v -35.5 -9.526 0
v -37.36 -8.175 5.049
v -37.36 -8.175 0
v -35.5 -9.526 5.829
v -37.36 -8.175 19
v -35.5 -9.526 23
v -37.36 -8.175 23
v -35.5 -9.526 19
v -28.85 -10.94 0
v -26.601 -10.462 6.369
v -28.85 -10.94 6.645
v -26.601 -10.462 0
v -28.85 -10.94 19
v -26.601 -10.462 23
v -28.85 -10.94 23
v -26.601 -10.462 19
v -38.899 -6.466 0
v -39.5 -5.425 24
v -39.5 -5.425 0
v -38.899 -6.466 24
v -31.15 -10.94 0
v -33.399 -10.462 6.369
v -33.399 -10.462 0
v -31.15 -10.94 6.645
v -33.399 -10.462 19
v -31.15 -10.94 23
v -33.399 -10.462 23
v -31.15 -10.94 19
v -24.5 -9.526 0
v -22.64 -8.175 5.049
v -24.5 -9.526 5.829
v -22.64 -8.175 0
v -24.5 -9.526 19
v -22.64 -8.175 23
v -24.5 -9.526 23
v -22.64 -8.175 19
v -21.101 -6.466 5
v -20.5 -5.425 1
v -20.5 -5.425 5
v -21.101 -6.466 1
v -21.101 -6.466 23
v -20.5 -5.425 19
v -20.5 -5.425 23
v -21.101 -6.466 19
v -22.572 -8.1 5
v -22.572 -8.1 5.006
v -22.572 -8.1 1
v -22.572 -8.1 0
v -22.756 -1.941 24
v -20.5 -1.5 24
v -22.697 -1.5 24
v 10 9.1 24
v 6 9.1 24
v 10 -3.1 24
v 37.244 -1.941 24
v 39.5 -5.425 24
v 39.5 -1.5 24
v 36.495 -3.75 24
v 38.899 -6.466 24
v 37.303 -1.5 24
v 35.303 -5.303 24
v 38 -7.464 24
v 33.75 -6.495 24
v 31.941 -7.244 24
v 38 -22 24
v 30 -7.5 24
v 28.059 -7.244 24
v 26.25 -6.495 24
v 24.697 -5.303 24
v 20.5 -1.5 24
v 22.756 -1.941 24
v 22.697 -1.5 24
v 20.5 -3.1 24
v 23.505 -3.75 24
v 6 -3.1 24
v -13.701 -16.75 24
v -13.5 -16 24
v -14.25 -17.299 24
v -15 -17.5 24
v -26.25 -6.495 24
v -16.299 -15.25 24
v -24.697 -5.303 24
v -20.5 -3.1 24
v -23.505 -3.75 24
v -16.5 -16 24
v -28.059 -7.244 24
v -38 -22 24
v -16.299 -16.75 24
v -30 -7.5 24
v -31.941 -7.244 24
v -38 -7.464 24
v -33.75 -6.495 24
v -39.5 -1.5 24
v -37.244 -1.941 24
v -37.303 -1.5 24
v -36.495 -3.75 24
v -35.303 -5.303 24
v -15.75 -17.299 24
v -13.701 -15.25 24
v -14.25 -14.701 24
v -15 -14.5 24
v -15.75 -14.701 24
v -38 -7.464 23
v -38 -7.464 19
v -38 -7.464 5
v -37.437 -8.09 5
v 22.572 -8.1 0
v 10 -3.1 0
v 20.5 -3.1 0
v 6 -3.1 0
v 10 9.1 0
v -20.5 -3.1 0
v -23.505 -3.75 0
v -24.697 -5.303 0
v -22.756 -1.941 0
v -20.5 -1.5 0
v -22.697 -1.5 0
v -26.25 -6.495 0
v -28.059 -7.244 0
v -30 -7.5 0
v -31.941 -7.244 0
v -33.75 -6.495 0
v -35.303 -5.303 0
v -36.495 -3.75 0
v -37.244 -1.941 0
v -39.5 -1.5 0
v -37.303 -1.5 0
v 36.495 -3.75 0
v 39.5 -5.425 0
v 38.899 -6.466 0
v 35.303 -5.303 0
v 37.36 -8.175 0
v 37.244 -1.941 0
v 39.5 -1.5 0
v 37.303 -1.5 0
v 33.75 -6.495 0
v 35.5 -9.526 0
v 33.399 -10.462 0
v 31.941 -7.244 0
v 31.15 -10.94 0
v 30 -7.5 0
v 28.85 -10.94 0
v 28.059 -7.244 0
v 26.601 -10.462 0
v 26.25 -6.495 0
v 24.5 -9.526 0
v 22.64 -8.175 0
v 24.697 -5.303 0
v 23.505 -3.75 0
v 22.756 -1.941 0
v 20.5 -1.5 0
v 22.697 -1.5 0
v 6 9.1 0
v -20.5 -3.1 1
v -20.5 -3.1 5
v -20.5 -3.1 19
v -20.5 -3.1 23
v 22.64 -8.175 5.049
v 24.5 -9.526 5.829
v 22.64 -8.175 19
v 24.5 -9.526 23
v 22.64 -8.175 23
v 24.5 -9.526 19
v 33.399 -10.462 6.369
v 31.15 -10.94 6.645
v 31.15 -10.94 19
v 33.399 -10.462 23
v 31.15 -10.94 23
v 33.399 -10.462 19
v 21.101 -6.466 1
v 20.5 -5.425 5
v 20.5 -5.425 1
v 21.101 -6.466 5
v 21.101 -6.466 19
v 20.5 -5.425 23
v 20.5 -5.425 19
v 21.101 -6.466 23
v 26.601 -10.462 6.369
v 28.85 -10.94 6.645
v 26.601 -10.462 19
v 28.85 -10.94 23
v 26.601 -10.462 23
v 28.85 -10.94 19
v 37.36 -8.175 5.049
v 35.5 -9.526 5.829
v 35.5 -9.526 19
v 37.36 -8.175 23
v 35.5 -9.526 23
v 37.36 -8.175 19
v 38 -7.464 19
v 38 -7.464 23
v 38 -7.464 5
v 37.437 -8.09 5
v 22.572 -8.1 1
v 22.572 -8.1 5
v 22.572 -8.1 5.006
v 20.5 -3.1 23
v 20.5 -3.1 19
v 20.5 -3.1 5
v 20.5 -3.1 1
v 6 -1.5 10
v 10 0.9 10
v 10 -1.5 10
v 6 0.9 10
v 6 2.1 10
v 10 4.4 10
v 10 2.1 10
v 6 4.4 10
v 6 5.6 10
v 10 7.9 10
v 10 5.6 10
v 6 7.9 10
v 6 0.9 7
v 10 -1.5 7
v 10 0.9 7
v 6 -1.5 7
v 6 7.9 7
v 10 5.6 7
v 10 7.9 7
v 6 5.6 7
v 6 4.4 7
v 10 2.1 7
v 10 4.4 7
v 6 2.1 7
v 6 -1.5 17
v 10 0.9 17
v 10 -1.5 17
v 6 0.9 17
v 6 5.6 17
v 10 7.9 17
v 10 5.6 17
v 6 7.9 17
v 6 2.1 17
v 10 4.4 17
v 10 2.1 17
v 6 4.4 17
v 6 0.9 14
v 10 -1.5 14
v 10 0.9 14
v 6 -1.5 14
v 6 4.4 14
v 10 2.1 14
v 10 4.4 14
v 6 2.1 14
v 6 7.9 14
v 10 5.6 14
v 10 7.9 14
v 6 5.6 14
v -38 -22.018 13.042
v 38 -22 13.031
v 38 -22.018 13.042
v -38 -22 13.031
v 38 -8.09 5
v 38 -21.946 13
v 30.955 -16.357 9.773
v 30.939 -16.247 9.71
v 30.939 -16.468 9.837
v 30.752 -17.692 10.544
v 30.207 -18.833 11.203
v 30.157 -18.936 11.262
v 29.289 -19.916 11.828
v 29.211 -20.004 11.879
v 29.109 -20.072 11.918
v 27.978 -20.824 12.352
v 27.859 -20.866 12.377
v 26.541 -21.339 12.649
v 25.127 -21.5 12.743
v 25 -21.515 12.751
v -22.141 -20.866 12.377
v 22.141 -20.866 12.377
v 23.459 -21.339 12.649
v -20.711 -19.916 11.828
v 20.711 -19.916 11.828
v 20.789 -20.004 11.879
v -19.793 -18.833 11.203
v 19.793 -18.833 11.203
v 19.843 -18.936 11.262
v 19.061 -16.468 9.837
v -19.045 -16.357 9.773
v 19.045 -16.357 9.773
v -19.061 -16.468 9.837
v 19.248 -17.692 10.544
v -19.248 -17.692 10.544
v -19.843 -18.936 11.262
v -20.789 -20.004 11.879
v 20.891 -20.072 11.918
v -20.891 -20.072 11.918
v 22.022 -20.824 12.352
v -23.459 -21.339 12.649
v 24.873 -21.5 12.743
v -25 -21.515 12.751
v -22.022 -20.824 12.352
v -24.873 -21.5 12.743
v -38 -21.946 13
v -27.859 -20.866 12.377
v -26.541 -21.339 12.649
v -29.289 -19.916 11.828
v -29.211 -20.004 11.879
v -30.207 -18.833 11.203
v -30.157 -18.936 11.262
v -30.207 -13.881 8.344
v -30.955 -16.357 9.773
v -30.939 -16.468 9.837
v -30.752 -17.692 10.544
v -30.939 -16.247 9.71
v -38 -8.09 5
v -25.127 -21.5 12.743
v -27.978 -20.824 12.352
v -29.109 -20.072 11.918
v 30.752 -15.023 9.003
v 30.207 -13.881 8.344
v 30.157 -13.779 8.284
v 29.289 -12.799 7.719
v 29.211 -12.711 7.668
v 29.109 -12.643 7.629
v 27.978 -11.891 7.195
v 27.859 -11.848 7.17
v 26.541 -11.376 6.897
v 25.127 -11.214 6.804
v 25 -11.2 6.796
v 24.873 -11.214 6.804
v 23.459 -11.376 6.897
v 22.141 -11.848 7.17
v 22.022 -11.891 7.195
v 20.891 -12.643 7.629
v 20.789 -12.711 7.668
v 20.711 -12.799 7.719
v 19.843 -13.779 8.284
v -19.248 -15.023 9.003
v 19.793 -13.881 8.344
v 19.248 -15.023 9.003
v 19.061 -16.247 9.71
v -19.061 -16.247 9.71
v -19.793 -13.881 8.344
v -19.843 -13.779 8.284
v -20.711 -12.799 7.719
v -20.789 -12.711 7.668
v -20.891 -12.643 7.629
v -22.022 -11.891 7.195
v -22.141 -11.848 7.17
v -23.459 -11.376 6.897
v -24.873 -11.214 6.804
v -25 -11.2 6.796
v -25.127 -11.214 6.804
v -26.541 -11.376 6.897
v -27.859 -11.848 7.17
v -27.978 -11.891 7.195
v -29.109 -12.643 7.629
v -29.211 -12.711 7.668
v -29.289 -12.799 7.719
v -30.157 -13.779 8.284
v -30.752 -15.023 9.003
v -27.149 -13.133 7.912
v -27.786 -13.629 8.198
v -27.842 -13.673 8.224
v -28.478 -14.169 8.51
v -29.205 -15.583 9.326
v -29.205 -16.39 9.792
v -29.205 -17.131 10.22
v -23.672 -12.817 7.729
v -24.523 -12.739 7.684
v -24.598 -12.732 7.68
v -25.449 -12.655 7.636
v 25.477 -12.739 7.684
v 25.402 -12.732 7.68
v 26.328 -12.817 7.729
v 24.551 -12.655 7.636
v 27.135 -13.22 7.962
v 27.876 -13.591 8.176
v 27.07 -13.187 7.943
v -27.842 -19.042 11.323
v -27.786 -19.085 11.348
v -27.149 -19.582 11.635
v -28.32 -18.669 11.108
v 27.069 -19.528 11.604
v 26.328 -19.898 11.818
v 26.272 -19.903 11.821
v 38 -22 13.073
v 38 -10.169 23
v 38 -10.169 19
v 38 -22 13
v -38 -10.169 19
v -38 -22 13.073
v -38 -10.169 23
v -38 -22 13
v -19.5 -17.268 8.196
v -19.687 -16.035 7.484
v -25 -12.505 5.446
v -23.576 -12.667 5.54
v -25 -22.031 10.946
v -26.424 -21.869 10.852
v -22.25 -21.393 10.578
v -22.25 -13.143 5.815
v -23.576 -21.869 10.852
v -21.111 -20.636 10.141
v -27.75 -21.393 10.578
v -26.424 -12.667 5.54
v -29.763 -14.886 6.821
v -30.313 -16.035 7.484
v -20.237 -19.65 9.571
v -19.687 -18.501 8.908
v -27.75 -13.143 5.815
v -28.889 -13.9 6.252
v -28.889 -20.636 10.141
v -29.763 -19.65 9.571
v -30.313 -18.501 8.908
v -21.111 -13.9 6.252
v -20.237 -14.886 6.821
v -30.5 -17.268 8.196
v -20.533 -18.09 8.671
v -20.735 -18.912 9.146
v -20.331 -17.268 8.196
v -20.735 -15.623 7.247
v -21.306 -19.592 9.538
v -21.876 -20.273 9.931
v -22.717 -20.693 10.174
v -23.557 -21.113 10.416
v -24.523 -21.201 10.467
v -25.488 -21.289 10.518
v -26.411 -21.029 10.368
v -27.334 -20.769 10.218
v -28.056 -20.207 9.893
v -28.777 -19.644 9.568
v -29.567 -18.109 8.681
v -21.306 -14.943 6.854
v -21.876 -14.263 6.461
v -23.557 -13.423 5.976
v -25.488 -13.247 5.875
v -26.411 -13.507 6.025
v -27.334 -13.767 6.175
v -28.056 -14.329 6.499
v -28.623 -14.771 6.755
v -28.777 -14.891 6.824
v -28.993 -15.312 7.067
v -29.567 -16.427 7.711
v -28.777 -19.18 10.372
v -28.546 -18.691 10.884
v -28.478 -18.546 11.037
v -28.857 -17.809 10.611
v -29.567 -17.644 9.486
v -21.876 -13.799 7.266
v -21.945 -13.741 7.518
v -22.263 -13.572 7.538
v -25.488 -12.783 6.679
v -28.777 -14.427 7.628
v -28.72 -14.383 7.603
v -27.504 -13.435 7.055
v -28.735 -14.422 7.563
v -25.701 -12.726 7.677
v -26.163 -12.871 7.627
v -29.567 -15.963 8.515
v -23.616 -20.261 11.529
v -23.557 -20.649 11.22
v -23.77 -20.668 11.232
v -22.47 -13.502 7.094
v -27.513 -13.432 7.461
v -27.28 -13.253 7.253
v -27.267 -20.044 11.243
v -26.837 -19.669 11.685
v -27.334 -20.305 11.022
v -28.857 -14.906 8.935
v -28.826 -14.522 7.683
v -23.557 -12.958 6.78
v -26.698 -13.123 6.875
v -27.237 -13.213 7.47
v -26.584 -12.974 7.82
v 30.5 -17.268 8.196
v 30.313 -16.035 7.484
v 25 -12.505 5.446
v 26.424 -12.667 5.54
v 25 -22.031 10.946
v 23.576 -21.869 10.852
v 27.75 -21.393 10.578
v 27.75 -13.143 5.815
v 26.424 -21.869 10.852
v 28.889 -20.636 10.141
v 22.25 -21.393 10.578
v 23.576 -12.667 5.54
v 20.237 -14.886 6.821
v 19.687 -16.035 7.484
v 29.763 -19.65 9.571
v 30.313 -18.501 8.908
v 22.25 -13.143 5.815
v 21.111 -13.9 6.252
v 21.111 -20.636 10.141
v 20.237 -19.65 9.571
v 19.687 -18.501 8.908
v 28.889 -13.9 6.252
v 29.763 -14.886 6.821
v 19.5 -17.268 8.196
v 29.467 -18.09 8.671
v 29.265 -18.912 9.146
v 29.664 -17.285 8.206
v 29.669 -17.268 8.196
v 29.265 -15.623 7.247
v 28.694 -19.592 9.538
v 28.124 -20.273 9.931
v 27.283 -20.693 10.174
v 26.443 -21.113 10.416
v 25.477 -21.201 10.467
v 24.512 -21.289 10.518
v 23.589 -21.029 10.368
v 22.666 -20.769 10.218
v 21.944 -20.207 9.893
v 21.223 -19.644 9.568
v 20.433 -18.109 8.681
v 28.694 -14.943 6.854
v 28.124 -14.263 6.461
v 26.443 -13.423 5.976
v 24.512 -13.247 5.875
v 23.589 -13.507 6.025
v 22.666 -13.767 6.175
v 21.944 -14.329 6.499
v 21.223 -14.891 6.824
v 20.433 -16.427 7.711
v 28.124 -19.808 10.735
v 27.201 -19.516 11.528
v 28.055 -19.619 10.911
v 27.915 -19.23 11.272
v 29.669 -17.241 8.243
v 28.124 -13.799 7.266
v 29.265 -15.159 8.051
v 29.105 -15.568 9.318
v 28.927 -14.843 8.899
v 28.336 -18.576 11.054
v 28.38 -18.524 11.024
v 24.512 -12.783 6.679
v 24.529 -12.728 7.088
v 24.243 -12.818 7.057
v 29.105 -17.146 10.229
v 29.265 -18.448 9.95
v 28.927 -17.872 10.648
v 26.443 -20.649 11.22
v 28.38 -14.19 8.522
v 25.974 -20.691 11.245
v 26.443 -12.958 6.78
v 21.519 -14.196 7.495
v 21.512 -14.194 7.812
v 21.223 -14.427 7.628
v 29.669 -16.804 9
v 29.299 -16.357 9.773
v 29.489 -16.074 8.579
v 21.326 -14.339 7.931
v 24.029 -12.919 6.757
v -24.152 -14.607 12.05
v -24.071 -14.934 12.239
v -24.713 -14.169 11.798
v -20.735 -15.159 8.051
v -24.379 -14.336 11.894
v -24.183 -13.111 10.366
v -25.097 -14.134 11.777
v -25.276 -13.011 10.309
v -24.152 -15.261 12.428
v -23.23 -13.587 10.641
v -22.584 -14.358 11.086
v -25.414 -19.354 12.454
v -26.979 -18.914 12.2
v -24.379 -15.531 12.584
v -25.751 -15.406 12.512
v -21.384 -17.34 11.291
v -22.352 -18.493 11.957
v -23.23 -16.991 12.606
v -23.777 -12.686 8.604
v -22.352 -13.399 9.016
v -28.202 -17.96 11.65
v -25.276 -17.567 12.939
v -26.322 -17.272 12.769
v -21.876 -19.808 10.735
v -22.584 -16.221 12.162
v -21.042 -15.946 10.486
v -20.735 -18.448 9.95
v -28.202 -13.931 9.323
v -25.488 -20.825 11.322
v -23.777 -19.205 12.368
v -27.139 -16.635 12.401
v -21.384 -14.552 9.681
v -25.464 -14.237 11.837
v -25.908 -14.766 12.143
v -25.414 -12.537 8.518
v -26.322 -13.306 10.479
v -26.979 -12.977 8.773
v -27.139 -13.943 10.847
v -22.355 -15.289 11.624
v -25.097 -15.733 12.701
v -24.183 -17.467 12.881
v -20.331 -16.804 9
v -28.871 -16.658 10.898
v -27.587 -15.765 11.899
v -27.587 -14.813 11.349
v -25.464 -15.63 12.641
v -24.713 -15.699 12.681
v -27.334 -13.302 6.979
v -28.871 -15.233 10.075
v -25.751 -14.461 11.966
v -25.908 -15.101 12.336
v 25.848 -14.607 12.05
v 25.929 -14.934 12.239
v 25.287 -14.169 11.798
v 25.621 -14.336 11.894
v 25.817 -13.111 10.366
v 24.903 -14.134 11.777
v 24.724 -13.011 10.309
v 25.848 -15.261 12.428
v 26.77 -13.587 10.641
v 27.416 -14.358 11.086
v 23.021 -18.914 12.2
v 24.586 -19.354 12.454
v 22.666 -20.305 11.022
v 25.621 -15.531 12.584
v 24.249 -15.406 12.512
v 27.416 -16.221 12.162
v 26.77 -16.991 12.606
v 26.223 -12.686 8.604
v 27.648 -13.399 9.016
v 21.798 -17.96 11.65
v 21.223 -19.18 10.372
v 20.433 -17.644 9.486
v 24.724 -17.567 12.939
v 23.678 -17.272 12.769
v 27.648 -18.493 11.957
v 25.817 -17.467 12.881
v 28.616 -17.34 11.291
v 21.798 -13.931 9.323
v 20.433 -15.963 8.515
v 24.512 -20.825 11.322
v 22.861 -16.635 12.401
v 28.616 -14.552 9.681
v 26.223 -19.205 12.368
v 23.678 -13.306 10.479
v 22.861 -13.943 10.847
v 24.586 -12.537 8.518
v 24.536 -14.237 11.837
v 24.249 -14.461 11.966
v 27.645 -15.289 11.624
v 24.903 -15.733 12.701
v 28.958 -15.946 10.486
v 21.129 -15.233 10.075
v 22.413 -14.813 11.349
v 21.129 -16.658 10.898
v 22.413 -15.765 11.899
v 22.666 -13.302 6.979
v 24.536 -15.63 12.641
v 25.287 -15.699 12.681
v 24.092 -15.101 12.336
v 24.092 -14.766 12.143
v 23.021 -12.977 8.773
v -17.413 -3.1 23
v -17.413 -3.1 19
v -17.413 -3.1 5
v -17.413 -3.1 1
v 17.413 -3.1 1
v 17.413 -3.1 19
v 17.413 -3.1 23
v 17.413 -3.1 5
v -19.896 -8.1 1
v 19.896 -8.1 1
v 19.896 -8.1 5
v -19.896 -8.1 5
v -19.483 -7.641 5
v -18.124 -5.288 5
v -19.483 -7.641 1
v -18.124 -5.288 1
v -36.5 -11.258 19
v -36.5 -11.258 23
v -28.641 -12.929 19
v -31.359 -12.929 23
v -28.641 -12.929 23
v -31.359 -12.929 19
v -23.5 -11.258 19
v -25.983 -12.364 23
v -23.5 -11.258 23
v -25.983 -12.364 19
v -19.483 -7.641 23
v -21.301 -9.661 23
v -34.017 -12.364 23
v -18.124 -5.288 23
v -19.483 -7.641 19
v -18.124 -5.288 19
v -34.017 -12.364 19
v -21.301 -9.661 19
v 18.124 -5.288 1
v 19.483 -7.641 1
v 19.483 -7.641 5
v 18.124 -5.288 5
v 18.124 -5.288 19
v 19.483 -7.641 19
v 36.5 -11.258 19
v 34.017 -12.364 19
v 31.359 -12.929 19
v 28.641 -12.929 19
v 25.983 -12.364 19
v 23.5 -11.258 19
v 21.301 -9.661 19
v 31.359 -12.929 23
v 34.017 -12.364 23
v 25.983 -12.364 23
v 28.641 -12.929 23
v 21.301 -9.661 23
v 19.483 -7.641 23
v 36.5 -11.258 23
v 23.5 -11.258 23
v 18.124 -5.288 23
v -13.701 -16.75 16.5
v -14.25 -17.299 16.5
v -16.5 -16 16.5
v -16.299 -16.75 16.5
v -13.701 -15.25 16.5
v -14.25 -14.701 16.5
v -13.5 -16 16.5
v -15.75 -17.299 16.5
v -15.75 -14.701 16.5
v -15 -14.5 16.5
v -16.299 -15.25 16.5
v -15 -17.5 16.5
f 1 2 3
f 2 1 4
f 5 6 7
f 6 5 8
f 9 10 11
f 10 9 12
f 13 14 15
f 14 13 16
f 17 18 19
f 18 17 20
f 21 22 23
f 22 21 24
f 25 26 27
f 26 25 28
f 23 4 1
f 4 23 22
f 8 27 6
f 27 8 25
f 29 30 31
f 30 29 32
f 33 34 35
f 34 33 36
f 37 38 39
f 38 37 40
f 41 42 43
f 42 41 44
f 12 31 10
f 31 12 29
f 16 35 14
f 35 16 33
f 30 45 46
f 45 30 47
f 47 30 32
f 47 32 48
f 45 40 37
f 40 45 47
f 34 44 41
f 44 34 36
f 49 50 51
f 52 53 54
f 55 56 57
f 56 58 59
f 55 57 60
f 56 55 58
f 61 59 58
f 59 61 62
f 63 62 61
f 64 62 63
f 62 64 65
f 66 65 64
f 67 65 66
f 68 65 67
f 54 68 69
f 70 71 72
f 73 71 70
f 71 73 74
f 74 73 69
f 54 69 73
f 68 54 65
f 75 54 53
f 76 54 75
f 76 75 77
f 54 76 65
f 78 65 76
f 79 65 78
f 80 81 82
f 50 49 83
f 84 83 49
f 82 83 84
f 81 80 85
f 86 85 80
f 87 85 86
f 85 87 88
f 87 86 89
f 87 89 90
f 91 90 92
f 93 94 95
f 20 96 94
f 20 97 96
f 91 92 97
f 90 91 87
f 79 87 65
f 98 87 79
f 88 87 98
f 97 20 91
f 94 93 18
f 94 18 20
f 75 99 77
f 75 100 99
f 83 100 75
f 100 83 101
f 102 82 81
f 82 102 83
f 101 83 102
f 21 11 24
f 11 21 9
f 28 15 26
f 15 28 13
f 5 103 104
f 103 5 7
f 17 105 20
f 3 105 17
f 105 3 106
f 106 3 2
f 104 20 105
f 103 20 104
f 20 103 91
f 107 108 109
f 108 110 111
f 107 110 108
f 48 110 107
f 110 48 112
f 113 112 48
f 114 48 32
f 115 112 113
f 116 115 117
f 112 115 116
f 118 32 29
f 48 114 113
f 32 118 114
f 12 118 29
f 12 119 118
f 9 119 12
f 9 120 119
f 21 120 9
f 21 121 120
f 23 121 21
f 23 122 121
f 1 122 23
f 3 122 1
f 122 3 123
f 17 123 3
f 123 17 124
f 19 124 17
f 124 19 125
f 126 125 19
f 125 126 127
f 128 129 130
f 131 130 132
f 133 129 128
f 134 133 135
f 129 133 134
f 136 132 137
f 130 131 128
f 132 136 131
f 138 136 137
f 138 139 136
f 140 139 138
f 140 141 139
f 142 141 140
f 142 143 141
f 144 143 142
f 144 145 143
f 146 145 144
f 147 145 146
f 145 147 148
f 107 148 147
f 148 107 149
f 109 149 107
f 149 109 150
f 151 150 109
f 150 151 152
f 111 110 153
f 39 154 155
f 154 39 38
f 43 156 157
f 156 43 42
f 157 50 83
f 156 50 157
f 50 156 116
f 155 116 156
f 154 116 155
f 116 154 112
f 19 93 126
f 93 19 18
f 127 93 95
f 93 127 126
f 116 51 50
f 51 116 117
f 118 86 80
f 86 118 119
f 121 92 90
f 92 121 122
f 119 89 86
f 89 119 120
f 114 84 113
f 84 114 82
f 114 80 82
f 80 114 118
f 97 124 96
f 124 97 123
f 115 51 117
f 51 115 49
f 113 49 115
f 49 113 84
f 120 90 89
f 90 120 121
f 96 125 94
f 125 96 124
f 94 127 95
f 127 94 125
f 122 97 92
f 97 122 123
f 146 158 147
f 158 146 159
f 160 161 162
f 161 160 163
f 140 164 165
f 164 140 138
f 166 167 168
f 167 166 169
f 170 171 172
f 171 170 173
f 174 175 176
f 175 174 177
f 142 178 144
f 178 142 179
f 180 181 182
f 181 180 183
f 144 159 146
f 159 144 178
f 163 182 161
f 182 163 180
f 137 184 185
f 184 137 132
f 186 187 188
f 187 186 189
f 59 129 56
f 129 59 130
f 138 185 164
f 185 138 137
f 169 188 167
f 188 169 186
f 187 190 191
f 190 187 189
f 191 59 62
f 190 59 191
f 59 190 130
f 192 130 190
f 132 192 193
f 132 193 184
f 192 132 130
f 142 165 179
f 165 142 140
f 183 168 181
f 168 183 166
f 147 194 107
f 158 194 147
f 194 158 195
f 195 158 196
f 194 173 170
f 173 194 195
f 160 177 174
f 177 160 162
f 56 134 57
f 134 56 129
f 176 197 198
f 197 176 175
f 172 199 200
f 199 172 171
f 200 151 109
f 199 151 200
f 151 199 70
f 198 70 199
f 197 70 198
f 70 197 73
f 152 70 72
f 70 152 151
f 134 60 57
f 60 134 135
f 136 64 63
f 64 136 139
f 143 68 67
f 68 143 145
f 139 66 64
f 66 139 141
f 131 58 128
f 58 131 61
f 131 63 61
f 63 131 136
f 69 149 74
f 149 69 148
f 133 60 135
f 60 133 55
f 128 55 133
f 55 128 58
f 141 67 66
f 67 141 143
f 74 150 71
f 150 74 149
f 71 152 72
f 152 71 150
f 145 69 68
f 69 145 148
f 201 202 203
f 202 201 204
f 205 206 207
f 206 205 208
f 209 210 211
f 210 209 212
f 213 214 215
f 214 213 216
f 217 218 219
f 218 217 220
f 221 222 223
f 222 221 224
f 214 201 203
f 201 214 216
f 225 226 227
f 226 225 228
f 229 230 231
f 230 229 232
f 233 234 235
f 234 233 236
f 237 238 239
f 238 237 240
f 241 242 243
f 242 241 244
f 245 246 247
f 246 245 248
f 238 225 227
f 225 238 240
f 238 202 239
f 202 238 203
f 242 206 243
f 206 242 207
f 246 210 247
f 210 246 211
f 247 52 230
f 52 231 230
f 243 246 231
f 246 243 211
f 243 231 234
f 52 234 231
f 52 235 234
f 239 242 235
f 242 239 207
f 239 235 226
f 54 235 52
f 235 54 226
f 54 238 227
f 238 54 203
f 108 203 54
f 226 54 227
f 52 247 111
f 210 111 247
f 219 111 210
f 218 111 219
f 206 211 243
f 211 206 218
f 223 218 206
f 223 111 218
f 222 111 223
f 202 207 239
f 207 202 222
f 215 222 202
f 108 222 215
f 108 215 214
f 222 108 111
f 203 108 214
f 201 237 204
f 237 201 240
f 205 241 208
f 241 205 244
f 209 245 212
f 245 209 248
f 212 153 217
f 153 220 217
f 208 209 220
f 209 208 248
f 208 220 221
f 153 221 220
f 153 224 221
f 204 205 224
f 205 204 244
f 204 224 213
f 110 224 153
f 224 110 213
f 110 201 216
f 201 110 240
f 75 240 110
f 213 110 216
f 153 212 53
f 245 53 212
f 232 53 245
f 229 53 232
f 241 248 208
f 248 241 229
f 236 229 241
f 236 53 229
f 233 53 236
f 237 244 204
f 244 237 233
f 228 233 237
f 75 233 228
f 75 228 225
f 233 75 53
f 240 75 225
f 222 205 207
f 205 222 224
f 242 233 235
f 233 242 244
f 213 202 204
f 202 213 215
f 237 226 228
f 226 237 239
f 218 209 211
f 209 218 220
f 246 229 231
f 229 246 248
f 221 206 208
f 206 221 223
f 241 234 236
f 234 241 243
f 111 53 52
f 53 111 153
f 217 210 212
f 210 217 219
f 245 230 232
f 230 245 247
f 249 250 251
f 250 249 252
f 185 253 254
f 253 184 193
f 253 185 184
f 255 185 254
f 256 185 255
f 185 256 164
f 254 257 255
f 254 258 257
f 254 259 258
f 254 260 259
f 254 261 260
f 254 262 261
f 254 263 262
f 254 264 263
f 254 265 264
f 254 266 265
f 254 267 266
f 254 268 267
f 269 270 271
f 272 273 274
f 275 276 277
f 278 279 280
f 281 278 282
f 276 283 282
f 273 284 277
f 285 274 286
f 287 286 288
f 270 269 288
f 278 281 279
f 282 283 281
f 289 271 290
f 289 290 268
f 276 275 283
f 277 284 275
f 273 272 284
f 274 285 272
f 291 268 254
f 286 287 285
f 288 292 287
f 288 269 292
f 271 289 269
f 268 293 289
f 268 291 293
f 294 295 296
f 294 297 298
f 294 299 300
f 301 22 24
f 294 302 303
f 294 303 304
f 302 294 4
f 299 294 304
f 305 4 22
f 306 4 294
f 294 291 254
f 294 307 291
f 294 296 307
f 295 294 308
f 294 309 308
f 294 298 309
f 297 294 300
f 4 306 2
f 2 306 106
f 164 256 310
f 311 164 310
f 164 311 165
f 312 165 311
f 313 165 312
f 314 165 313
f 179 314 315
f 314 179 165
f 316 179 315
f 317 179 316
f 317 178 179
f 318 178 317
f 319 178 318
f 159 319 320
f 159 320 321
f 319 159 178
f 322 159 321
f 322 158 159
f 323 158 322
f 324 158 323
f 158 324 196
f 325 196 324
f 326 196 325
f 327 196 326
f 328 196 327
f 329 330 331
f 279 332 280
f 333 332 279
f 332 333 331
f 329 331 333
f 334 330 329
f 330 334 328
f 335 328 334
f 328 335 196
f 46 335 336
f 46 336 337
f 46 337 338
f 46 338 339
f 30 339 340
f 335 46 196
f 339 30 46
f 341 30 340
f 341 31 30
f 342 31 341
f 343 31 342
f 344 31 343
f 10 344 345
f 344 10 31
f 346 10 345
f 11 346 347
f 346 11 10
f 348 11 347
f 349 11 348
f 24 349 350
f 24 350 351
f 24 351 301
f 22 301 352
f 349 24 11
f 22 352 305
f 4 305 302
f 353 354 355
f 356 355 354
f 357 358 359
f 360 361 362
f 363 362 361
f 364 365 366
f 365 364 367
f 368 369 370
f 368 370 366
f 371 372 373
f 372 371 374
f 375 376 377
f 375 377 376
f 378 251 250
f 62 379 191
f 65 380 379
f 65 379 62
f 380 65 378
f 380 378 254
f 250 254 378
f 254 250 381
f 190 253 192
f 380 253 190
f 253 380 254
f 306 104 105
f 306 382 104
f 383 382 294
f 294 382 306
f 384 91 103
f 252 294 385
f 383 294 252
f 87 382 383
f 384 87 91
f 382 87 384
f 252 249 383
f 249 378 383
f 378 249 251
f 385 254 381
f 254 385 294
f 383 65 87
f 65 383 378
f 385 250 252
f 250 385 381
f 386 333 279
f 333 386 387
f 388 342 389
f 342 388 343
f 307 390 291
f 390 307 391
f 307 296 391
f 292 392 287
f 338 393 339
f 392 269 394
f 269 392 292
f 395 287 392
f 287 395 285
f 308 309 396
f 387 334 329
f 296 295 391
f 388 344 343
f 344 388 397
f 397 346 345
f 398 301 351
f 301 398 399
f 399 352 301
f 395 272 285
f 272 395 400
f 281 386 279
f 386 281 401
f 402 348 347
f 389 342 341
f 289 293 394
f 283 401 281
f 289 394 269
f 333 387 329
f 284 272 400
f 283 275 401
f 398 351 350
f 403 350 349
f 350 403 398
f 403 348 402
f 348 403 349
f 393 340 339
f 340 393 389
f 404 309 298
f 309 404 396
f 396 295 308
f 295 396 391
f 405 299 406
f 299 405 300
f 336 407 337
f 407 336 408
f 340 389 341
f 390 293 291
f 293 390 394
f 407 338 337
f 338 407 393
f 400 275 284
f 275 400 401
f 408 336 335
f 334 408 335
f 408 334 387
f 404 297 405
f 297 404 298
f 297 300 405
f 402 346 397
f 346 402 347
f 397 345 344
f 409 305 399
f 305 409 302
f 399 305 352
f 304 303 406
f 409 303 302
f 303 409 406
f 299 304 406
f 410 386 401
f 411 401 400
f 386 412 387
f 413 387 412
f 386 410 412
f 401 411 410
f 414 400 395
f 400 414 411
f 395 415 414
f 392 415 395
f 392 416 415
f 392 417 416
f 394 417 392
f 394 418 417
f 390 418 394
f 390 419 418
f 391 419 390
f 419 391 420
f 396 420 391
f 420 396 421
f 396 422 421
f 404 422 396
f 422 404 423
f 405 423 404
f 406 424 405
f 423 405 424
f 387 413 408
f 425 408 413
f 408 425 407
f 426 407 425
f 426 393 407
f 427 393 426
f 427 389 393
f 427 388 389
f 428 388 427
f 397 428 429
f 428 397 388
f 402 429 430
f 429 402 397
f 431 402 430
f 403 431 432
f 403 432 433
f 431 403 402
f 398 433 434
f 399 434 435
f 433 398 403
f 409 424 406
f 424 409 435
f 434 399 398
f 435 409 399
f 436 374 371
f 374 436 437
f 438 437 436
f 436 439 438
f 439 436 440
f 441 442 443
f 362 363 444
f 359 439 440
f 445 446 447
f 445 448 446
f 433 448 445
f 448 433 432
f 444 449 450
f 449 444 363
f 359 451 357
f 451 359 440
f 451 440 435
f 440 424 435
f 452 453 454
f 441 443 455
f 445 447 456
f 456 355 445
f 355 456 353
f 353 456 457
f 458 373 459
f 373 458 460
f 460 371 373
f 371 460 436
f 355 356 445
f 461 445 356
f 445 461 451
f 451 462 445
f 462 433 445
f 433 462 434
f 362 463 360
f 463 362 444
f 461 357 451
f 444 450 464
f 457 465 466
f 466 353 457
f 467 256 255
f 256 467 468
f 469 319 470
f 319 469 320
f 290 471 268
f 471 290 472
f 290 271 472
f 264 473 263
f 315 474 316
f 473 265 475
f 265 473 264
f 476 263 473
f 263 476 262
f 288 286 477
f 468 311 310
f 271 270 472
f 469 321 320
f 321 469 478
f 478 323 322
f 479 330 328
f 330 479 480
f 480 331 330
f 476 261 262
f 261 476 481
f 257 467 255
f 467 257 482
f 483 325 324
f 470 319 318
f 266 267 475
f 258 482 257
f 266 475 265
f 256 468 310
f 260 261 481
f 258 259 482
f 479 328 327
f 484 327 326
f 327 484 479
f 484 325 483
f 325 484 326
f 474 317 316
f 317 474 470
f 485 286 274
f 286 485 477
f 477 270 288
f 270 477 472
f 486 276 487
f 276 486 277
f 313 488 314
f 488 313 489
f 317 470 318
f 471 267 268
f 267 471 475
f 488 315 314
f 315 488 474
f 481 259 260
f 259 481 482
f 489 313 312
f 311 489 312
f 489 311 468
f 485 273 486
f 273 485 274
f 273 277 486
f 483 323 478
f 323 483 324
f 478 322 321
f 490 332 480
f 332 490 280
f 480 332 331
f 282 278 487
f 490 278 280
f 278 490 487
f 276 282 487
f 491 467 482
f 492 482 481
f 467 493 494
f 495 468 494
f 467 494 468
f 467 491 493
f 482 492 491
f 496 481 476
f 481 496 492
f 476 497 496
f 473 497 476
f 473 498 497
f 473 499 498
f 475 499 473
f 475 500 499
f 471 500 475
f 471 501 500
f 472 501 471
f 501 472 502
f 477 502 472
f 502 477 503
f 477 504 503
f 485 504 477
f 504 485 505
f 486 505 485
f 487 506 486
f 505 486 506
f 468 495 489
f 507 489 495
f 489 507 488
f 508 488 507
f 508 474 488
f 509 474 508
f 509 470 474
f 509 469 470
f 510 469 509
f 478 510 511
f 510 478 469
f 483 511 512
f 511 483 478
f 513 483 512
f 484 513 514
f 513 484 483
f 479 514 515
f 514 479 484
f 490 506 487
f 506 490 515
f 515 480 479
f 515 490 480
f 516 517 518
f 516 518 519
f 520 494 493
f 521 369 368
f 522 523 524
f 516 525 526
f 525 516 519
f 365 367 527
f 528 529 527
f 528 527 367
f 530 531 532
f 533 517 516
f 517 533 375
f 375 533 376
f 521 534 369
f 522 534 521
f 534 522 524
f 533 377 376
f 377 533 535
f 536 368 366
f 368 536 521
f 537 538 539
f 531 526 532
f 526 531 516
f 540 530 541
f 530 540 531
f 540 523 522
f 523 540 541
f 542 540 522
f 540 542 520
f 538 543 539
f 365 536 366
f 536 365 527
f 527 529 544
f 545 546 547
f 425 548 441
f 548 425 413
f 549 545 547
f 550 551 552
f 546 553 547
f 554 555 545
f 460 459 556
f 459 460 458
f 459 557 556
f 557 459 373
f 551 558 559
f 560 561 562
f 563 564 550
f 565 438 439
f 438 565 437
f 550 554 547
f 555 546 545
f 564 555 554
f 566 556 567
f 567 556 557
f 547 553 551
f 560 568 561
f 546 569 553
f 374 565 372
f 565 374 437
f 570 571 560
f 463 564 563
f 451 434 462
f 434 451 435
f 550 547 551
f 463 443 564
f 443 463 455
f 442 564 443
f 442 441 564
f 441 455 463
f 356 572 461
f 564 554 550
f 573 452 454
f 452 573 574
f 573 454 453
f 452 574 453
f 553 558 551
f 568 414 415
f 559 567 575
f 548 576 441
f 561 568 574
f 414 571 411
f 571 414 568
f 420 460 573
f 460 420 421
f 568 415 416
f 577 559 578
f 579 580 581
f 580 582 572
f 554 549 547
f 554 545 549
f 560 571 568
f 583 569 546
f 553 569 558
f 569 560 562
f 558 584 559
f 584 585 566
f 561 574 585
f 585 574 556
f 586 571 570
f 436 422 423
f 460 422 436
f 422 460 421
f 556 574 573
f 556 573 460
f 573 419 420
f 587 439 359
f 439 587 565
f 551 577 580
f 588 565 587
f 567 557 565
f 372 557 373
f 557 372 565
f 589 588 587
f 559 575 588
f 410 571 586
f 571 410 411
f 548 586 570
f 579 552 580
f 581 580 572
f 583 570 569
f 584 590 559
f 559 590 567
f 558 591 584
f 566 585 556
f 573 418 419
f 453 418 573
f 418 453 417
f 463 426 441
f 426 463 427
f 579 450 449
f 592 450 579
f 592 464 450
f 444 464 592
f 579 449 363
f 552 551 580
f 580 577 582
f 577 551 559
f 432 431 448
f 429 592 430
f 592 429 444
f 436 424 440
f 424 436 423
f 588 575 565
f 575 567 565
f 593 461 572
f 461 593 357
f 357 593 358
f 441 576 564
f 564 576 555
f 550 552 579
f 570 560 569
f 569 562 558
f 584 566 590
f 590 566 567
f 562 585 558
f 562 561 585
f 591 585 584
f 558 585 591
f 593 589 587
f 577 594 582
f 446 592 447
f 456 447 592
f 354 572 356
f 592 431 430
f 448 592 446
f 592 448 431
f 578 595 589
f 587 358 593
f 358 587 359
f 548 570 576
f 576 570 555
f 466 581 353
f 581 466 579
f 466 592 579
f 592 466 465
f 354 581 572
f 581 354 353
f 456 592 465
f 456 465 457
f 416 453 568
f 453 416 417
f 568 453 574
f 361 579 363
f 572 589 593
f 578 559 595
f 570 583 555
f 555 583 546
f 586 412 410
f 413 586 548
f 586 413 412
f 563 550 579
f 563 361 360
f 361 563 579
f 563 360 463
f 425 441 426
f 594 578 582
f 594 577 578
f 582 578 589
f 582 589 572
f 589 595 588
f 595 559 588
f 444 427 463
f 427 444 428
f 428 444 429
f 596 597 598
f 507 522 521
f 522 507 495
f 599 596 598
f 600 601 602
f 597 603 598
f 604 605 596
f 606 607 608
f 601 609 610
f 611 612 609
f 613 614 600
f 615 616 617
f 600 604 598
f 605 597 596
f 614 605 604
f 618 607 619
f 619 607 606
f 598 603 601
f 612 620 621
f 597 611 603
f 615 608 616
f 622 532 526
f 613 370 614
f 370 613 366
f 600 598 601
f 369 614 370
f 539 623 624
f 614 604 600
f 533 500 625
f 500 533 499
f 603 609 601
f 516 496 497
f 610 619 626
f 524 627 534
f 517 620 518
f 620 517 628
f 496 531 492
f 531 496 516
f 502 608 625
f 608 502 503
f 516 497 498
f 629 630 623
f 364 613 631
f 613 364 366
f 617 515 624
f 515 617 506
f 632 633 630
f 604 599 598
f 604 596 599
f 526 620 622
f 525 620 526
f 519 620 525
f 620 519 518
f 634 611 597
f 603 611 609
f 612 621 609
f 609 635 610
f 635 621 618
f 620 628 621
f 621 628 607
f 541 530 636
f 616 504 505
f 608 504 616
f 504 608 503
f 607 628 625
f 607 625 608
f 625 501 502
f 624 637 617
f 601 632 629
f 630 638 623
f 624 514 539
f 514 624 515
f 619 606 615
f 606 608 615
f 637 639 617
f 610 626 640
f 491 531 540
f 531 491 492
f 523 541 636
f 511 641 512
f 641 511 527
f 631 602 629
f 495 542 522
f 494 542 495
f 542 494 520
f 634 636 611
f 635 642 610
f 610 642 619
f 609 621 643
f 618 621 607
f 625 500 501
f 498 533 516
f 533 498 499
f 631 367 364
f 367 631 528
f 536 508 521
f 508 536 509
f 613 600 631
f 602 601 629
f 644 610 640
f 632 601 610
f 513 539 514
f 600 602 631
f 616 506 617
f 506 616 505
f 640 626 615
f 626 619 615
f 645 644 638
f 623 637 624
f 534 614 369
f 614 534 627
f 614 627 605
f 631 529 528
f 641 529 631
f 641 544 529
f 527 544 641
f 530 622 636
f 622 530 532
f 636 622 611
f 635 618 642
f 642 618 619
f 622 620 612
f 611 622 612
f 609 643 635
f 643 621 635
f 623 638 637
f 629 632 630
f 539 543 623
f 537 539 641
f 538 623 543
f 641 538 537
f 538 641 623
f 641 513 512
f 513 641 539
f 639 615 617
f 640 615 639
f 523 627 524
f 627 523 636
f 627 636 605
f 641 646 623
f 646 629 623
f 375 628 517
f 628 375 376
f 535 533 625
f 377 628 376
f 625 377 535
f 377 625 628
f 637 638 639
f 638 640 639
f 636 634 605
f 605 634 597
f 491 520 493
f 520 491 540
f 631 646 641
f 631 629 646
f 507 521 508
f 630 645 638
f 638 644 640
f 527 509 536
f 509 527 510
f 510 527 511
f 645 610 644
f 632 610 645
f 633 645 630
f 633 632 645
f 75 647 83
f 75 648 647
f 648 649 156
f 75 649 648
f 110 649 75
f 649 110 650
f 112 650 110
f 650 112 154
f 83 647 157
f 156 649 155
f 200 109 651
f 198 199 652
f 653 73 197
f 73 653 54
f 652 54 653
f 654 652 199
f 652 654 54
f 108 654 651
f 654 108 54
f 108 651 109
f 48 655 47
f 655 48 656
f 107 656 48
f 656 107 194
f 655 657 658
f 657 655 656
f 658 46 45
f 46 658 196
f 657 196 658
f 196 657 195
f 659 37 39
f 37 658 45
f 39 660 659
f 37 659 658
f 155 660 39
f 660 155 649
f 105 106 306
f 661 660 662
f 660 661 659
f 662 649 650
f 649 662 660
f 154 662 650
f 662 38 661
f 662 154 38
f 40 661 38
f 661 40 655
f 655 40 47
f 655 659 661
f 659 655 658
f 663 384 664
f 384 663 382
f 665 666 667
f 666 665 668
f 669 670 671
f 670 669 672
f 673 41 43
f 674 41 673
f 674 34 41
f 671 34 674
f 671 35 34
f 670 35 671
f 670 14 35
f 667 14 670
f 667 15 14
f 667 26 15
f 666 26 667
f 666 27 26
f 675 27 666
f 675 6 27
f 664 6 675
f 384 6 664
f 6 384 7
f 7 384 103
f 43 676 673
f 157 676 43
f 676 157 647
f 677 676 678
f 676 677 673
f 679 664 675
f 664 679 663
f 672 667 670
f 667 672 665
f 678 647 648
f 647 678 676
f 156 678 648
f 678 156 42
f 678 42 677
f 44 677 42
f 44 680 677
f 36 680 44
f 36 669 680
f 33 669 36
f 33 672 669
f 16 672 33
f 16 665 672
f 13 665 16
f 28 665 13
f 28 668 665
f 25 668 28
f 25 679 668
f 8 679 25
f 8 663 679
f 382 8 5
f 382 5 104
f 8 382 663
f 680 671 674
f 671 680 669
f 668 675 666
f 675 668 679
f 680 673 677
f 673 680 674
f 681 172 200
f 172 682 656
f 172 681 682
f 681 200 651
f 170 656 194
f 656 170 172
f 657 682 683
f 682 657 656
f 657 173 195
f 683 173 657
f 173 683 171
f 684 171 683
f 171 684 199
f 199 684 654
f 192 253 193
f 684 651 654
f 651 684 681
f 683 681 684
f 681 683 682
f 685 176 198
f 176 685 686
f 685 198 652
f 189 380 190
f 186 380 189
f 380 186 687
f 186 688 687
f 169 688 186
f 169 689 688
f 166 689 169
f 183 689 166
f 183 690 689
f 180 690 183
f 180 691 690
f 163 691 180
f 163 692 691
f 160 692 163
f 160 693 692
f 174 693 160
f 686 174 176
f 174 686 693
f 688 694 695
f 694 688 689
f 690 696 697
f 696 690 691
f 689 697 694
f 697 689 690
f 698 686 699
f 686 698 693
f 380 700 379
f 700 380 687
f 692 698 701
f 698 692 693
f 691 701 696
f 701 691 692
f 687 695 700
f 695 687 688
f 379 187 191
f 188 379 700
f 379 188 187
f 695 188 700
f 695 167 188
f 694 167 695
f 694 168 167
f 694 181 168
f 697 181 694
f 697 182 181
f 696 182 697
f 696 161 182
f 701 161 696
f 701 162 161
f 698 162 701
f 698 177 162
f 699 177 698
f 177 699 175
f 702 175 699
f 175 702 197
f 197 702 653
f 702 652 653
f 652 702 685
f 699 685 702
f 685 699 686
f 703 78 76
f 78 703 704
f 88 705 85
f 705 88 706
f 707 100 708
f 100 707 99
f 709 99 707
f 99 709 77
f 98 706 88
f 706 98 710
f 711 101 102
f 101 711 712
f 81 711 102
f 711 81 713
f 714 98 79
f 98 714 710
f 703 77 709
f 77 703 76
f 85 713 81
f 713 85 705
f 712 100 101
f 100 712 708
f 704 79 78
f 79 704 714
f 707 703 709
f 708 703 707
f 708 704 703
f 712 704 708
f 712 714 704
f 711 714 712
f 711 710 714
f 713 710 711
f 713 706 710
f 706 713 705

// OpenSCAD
// file: configuration.scad
motor_end_height=44;
//idler_end_height=28;
idler_end_height=44;
carriage_height=24;
platform_thickness=8;

sanguinololu=true;					// places mounting holes for the Sanguinololu controller
carbon_rods=true;					// turns on option for carbon diagonal rods just for looks!

frame_thickness=6;   				// 6mm acrylic
pcb_thickness=2;						// used for rendering PCB and approximating build volume

smooth_rod_length=495;  				// determins vertical build height with 508 for 8" 
rod_diameter=8;						// might be interesting to have larger rods
platform_hinge_offset=33;
carriage_hinge_offset=22;

printbed=[155,155];  				// printrbed 6x6 -  210,210 for prusa 8x8 platform
printbed_screw_spacing=[146.5,147]; 	// sets screw spacing for heated bed default: printrbed

tower_radius = printbed[0]*0.9;
//rod_length=printbed[0]*1.2;
rod_length=187+9.54;

corner_radius=12;
frame_radius=(tower_radius-rod_diameter/2-corner_radius)/cos(30);

//jjt
magnetsize=9.52/2;
// main file
include <configuration.scad>

width = 76;
height = carriage_height;

offset = 25;
dimple = 16;
middle = 2*offset - width/2;
//magnetsize = 9.52/2; // 3/8" (9.52mm) dia. for mini

//from jaws.scad
//h = 7;
//r = h/2 / cos(30);

module dimple_joints() {
			for (x = [-offset, offset]) {
			  rotate([-30,0,0]) translate([x, 2, 7])
					union() {
						difference() {
							cylinder(r1=(dimple-5)/2, r2=(dimple-4)/2, h=2, center=true, $fn=24);
							translate([0,0,-1]) sphere(magnetsize);
							
						}
						//uncomment to show the magnet
						//translate([0,0,-1]) sphere(magnetsize);
					}
			}
}

module dimple_holes(msize) {
			for (x = [-offset, offset]) {
			  rotate([-30,0,0]) translate([x, 2, 7])
						translate([0,0,-1]) sphere(msize);
			}
}

module parallel_joints(reinforced) {
	difference() {
		union() {
			union() {
				intersection() {
					translate([0, 18, 6]) rotate([-30, 0, 0]) cube([width, reinforced+18.25, reinforced-3.25], center=true);
					translate([0, 0, 6]) cube([width, reinforced+16, reinforced-4], center=true);
				}
				//translate([0, 8, 12]) cube([width, 16, 5], center=true);
				translate([0, 8, 14.5]) cube([width, 16, 11], center=true);
			}

			dimple_joints();
	//    translate([0, 0, 0]) cube([2*middle  -4, 20, 100], center=true);
		}
//    translate([0, 0, 0]) cube([2*middle  -4, 20, 100], center=true);
		dimple_holes(magnetsize);
	}
}

module lm8uu_mount(d, h) {
  union() {
    difference() {
      intersection() {
        cylinder(r=11, h=h, center=true);
        translate([0, -8, 0]) cube([19, 13, h+1], center=true);
      }
      cylinder(r=d/2, h=h+1, center=true);
    }
  }
}

module belt_mount() {
  difference() {
    union() {
      difference() {
        translate([8, 2, 0]) cube([4, 13, height], center=true);
        for (z = [-3.5, 3.5])
          translate([8, 5, z])
            cube([5, 13, 3], center=true);
      }
      for (y = [1.5, 5, 8.5]) {
        translate([8, y, 0]) cube([4, 1.2, height], center=true);
      }
    }
  }
}

module carriage() {
  translate([0, 0, height/2]) 
  union() {
    for (x = [-30, 30]) {
      translate([x, 0, 0]) lm8uu_mount(d=15, h=24);
    }
    belt_mount();
    difference() {
      union() {
        translate([0, -5.6, 0])
          cube([50, 5, height], center=true);
        translate([0, -carriage_hinge_offset, -height/2+4])
	      parallel_joints(16);
      }

      // Screw hole for adjustable top endstop.
      translate([-15, -16, height/2  ])
        cylinder(r=1.5, h=15, center=true, $fn=12);

      for (x = [-30, 30]) {
        translate([x, 0, 0])
          cylinder(r=8, h=height+1, center=true);
        // Zip tie tunnels.
        for (z = [-height/2+3, height/2-3])
          translate([x, 0, z])
            cylinder(r=13, h=4, center=true);
      }
    }
  }
}

carriage();

// Uncomment the following lines to check endstop alignment.
// use <idler_end.scad>;
// translate([0, 0, -20]) rotate([180, 0, 0]) idler_end();
